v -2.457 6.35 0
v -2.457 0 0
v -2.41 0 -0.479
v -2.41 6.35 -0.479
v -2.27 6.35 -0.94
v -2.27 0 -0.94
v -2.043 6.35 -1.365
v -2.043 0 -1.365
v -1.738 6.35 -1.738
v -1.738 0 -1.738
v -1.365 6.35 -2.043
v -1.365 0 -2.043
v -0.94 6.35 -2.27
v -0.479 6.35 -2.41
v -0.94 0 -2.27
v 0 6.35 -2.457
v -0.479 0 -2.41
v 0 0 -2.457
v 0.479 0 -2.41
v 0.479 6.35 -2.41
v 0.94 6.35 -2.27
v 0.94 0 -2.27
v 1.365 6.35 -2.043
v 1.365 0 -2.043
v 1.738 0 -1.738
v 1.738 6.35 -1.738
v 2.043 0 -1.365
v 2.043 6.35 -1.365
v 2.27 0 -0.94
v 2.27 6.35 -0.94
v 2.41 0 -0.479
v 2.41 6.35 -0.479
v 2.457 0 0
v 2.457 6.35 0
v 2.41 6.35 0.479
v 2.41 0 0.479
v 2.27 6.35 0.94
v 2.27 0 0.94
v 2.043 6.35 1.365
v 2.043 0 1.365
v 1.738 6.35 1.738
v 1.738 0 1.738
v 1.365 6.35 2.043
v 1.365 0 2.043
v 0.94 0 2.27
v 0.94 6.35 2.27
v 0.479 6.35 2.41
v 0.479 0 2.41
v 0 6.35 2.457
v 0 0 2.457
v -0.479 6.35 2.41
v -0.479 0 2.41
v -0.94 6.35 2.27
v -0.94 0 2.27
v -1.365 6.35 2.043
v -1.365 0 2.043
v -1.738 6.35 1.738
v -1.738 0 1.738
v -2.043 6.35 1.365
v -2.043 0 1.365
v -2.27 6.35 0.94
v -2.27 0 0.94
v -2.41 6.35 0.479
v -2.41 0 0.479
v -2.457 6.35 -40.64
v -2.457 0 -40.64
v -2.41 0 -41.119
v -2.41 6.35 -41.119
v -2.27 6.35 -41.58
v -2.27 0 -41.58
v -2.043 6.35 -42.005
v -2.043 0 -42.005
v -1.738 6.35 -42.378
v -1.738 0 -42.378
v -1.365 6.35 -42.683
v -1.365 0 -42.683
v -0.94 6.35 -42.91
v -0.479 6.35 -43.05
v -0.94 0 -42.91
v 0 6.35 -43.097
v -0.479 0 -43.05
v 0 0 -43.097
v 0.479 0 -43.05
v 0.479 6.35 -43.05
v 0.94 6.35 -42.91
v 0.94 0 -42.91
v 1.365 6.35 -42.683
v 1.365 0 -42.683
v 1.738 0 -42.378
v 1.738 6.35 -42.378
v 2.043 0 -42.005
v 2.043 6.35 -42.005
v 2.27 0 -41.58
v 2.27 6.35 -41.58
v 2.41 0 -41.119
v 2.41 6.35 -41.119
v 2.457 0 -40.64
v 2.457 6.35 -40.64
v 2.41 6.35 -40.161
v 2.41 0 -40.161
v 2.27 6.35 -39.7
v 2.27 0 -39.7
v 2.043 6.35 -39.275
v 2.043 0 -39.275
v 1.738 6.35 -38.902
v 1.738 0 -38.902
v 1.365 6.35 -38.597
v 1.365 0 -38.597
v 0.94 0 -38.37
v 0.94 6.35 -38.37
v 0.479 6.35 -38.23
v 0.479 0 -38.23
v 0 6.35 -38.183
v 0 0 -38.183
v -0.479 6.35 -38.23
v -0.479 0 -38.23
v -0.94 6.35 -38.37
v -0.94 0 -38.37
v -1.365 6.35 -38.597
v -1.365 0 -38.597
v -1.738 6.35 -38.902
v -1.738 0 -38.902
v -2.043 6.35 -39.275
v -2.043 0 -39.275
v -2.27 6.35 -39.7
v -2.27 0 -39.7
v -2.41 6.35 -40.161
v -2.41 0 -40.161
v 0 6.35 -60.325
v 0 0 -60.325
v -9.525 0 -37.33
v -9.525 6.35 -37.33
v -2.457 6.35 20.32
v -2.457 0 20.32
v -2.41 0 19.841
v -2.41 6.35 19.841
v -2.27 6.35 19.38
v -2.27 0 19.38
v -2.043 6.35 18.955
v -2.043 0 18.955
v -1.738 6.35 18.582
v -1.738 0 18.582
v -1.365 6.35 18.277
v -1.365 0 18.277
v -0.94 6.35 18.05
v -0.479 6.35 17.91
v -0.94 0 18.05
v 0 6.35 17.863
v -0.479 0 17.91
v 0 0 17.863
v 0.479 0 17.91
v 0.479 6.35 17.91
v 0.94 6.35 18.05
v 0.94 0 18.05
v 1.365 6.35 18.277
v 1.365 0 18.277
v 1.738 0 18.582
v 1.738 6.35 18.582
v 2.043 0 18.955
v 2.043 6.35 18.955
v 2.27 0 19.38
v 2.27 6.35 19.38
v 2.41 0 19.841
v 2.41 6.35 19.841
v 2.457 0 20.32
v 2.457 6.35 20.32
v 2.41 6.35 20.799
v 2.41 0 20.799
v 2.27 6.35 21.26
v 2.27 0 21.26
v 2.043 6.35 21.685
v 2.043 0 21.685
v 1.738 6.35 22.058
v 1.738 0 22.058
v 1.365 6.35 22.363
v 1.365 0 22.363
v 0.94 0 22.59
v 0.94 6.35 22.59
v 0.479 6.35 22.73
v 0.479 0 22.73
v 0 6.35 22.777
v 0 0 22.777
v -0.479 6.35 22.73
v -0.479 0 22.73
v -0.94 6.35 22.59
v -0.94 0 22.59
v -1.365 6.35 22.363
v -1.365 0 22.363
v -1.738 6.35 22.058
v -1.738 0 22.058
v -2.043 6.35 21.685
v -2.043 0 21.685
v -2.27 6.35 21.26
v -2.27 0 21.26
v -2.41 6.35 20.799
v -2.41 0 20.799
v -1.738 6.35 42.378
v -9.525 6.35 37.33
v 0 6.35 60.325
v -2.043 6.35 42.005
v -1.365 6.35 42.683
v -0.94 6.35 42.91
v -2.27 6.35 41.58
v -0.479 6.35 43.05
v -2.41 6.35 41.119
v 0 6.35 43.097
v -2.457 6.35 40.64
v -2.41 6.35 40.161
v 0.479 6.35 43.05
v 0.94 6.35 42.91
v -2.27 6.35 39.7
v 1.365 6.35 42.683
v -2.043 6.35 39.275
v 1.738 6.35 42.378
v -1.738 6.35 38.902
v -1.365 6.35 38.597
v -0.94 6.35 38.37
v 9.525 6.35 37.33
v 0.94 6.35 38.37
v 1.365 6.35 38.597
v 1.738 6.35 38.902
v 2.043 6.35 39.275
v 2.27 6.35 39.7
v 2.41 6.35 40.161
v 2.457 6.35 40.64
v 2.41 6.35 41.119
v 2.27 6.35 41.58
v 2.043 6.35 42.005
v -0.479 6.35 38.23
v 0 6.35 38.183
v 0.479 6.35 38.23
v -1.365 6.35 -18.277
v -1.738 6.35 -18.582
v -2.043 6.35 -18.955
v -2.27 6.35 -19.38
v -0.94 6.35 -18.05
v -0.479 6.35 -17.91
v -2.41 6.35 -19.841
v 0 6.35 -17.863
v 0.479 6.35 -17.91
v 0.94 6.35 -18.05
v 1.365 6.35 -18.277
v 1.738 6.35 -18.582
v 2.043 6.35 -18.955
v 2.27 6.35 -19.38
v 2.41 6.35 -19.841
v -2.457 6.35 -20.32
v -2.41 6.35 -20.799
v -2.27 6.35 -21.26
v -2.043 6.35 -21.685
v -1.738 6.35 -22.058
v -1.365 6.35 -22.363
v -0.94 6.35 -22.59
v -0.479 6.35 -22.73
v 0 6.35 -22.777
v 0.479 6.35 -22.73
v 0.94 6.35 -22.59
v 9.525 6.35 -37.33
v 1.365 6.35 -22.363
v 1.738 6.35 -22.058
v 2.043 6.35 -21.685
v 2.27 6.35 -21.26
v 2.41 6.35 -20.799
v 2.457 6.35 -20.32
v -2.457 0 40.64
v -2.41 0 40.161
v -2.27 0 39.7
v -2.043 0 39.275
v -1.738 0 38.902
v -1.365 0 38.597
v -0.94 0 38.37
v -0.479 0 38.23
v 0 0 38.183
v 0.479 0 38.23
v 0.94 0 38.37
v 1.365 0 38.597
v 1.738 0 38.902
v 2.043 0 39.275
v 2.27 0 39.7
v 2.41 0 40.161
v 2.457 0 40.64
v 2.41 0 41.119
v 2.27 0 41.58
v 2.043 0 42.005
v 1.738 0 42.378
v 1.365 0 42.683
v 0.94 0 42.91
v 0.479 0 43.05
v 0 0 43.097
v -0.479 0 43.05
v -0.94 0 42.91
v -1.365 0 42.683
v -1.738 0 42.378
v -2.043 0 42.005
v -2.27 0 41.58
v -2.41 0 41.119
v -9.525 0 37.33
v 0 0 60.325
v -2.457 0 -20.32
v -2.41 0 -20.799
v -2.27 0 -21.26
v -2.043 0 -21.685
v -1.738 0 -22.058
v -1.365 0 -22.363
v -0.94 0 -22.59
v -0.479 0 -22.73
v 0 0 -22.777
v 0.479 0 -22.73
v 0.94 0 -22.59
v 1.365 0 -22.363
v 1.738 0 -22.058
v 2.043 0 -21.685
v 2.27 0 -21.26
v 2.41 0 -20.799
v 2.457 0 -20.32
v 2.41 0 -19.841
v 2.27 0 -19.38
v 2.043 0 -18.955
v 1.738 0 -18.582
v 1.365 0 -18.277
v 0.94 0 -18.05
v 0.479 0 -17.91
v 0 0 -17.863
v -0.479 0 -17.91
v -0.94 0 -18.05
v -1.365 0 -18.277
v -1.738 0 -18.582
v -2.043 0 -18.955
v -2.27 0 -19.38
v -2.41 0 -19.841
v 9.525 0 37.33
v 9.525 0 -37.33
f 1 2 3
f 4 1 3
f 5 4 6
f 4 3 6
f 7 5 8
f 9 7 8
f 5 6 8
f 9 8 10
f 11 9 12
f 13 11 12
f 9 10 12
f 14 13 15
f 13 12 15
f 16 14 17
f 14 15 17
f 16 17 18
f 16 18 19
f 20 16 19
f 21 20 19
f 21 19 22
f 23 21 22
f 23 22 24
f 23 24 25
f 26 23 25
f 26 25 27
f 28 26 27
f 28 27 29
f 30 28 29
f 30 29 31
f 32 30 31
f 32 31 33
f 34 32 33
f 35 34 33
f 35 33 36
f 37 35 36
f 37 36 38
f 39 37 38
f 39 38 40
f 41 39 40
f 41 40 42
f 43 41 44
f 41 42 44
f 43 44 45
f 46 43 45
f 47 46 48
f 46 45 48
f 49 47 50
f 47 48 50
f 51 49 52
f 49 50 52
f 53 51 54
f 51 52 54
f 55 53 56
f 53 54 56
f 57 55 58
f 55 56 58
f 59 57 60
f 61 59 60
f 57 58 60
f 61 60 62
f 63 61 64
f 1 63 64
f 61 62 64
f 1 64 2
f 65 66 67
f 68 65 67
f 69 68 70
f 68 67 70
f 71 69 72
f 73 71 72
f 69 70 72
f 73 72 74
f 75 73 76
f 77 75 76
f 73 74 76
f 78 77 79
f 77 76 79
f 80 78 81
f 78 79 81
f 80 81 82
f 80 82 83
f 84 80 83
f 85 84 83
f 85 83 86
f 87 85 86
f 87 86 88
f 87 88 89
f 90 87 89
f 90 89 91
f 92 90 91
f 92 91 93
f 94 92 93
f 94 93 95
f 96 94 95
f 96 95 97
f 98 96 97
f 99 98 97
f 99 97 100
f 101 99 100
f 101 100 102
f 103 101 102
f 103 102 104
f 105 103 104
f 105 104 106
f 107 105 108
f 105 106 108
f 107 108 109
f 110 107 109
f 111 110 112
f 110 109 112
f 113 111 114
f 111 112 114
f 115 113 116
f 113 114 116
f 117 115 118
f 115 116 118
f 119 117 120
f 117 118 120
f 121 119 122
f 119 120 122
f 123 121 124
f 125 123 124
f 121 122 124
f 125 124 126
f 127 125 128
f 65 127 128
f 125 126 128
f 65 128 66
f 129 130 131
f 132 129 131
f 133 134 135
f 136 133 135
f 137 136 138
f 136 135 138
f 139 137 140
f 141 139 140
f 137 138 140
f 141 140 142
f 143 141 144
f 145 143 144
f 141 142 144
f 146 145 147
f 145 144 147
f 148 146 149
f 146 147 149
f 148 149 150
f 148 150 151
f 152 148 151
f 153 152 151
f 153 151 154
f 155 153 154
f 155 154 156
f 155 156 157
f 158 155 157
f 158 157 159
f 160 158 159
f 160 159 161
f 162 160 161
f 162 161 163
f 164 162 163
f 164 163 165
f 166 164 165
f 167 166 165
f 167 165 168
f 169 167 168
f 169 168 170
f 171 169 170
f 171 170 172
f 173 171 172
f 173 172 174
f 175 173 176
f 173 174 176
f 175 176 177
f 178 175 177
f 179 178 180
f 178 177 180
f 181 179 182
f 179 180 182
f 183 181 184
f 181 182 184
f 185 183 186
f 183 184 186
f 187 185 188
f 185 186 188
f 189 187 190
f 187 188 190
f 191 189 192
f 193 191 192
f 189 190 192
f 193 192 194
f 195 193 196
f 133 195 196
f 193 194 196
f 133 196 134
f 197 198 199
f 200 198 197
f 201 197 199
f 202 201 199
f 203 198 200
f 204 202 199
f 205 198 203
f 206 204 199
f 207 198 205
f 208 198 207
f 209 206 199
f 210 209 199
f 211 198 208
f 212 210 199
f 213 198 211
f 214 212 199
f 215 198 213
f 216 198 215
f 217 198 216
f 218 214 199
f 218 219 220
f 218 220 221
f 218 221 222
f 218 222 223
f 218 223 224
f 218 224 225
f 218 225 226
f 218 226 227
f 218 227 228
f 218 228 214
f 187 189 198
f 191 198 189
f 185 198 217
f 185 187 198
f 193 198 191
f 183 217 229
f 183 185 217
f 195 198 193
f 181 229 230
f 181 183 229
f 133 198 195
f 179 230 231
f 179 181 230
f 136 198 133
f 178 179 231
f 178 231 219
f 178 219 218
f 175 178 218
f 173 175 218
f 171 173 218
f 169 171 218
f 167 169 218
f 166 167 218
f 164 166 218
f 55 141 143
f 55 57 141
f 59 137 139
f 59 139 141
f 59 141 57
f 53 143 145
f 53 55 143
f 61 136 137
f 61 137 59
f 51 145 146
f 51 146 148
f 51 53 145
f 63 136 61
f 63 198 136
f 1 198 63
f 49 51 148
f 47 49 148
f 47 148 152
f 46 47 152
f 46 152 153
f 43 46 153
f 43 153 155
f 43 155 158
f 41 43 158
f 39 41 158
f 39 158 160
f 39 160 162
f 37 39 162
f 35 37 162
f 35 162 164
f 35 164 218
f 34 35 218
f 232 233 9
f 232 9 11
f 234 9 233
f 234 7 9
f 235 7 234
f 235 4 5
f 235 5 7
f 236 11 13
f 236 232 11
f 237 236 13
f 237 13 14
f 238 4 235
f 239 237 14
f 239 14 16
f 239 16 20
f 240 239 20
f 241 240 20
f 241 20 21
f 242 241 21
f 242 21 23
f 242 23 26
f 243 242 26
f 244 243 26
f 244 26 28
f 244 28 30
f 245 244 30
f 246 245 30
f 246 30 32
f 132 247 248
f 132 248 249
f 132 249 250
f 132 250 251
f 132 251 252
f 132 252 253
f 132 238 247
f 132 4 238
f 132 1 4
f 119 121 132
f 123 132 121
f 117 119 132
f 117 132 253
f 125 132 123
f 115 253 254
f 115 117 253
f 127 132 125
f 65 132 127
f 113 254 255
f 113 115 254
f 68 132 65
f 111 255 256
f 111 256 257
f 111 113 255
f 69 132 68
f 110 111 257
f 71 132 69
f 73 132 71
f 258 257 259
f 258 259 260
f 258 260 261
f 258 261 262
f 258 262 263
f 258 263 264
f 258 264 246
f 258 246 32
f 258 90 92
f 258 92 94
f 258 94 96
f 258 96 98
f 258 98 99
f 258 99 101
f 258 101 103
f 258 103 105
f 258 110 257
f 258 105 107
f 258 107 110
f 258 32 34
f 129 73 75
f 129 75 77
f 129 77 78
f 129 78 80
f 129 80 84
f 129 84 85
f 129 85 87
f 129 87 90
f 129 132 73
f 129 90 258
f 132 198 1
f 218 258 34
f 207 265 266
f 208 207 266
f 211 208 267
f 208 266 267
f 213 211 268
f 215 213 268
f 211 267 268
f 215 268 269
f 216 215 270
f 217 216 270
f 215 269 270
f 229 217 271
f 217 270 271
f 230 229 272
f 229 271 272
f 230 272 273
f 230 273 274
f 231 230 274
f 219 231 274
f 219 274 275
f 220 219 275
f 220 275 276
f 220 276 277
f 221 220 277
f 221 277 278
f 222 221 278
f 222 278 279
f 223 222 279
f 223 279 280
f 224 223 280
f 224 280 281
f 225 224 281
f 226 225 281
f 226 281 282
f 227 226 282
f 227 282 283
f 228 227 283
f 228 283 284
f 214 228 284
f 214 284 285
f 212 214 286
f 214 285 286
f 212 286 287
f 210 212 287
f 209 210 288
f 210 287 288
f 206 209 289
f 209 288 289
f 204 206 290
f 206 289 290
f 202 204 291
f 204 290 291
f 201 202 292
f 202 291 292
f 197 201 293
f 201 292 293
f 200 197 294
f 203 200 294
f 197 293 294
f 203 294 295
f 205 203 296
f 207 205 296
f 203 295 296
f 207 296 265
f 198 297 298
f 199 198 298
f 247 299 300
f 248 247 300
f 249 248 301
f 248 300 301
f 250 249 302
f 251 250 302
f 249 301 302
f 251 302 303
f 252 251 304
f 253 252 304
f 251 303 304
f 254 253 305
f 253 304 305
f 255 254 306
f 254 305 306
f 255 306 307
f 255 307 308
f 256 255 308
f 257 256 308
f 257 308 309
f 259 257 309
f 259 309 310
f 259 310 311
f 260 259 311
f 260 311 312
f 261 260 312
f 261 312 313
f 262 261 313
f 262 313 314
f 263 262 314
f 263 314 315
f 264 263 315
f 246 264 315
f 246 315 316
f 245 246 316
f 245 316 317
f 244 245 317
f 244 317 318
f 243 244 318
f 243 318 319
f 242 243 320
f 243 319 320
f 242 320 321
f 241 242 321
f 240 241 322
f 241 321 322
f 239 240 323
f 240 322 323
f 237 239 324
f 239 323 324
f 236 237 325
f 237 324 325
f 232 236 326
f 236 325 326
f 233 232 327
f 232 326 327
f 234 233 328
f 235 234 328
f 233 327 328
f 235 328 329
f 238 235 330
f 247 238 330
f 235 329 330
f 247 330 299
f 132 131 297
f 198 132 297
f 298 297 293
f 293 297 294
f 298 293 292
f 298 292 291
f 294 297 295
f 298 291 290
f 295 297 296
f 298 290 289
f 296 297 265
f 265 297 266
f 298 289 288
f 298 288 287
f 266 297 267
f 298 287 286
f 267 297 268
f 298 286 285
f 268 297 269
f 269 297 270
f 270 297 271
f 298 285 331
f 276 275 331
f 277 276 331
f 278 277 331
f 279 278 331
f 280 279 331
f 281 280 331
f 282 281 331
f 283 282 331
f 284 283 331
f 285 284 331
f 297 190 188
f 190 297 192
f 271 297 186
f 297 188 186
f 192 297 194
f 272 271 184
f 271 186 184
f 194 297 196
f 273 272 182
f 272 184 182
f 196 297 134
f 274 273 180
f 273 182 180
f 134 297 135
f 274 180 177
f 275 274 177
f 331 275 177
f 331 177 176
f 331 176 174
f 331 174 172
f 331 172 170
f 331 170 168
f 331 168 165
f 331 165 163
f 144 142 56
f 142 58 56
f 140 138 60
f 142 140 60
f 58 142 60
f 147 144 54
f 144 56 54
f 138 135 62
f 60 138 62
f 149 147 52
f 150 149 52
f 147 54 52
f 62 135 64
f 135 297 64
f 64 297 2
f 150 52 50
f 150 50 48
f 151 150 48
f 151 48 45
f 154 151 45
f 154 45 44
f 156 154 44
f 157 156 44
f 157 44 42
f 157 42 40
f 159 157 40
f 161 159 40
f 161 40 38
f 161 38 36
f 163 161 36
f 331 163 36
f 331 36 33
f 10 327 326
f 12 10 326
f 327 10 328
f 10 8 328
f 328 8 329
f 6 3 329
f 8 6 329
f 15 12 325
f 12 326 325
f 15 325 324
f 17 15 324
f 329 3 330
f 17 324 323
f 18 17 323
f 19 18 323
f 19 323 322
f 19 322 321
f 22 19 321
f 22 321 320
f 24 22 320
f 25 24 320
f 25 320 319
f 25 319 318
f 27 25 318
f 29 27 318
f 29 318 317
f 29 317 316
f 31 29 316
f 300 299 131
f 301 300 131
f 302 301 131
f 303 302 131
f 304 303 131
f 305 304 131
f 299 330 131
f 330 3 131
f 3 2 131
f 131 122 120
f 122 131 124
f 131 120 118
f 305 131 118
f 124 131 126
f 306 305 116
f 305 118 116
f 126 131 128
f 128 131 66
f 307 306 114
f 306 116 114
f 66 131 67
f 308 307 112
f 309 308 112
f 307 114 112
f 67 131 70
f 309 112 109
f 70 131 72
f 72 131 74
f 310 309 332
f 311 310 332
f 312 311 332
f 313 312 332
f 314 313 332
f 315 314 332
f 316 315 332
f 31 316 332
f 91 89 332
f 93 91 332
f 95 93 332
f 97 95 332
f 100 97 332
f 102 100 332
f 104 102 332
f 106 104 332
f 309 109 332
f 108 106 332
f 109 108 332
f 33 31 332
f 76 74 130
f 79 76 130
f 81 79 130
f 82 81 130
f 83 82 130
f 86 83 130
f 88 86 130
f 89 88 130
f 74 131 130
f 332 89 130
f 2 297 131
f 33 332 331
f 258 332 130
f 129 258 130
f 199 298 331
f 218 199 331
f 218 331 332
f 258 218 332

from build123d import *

# Parameters (mm, degrees)
BOSS_EXTRUDE1_DEPTH          = 6.35
F_10_0_1935_DIAMETER_HOLE1_D = 4.9149


with BuildPart() as part:
    # Sketch1 → Boss-Extrude1 (new body)
    with BuildSketch(Plane(origin=(0, 0, 0), x_dir=(1, 0, 0), z_dir=(0, 1, 0))):
        Polygon((0, 60.325), (-9.525, 37.329615818), (-9.525, -37.329615818), (0, -60.325), (9.525, -37.329615818), (9.525, 37.329615818), align=None)
    extrude(amount=BOSS_EXTRUDE1_DEPTH)

    # #10 (0.1935) Diameter Hole1 (through all)
    with Locations(Plane(origin=(0, 6.35, 0), x_dir=(1, 0, 0), z_dir=(0, 1, 0))):
        with Locations((0, 20.32), (0, 40.64), (0, 0), (0, -20.32), (0, -40.64)):
            Hole(F_10_0_1935_DIAMETER_HOLE1_D / 2)


solid = part.part
